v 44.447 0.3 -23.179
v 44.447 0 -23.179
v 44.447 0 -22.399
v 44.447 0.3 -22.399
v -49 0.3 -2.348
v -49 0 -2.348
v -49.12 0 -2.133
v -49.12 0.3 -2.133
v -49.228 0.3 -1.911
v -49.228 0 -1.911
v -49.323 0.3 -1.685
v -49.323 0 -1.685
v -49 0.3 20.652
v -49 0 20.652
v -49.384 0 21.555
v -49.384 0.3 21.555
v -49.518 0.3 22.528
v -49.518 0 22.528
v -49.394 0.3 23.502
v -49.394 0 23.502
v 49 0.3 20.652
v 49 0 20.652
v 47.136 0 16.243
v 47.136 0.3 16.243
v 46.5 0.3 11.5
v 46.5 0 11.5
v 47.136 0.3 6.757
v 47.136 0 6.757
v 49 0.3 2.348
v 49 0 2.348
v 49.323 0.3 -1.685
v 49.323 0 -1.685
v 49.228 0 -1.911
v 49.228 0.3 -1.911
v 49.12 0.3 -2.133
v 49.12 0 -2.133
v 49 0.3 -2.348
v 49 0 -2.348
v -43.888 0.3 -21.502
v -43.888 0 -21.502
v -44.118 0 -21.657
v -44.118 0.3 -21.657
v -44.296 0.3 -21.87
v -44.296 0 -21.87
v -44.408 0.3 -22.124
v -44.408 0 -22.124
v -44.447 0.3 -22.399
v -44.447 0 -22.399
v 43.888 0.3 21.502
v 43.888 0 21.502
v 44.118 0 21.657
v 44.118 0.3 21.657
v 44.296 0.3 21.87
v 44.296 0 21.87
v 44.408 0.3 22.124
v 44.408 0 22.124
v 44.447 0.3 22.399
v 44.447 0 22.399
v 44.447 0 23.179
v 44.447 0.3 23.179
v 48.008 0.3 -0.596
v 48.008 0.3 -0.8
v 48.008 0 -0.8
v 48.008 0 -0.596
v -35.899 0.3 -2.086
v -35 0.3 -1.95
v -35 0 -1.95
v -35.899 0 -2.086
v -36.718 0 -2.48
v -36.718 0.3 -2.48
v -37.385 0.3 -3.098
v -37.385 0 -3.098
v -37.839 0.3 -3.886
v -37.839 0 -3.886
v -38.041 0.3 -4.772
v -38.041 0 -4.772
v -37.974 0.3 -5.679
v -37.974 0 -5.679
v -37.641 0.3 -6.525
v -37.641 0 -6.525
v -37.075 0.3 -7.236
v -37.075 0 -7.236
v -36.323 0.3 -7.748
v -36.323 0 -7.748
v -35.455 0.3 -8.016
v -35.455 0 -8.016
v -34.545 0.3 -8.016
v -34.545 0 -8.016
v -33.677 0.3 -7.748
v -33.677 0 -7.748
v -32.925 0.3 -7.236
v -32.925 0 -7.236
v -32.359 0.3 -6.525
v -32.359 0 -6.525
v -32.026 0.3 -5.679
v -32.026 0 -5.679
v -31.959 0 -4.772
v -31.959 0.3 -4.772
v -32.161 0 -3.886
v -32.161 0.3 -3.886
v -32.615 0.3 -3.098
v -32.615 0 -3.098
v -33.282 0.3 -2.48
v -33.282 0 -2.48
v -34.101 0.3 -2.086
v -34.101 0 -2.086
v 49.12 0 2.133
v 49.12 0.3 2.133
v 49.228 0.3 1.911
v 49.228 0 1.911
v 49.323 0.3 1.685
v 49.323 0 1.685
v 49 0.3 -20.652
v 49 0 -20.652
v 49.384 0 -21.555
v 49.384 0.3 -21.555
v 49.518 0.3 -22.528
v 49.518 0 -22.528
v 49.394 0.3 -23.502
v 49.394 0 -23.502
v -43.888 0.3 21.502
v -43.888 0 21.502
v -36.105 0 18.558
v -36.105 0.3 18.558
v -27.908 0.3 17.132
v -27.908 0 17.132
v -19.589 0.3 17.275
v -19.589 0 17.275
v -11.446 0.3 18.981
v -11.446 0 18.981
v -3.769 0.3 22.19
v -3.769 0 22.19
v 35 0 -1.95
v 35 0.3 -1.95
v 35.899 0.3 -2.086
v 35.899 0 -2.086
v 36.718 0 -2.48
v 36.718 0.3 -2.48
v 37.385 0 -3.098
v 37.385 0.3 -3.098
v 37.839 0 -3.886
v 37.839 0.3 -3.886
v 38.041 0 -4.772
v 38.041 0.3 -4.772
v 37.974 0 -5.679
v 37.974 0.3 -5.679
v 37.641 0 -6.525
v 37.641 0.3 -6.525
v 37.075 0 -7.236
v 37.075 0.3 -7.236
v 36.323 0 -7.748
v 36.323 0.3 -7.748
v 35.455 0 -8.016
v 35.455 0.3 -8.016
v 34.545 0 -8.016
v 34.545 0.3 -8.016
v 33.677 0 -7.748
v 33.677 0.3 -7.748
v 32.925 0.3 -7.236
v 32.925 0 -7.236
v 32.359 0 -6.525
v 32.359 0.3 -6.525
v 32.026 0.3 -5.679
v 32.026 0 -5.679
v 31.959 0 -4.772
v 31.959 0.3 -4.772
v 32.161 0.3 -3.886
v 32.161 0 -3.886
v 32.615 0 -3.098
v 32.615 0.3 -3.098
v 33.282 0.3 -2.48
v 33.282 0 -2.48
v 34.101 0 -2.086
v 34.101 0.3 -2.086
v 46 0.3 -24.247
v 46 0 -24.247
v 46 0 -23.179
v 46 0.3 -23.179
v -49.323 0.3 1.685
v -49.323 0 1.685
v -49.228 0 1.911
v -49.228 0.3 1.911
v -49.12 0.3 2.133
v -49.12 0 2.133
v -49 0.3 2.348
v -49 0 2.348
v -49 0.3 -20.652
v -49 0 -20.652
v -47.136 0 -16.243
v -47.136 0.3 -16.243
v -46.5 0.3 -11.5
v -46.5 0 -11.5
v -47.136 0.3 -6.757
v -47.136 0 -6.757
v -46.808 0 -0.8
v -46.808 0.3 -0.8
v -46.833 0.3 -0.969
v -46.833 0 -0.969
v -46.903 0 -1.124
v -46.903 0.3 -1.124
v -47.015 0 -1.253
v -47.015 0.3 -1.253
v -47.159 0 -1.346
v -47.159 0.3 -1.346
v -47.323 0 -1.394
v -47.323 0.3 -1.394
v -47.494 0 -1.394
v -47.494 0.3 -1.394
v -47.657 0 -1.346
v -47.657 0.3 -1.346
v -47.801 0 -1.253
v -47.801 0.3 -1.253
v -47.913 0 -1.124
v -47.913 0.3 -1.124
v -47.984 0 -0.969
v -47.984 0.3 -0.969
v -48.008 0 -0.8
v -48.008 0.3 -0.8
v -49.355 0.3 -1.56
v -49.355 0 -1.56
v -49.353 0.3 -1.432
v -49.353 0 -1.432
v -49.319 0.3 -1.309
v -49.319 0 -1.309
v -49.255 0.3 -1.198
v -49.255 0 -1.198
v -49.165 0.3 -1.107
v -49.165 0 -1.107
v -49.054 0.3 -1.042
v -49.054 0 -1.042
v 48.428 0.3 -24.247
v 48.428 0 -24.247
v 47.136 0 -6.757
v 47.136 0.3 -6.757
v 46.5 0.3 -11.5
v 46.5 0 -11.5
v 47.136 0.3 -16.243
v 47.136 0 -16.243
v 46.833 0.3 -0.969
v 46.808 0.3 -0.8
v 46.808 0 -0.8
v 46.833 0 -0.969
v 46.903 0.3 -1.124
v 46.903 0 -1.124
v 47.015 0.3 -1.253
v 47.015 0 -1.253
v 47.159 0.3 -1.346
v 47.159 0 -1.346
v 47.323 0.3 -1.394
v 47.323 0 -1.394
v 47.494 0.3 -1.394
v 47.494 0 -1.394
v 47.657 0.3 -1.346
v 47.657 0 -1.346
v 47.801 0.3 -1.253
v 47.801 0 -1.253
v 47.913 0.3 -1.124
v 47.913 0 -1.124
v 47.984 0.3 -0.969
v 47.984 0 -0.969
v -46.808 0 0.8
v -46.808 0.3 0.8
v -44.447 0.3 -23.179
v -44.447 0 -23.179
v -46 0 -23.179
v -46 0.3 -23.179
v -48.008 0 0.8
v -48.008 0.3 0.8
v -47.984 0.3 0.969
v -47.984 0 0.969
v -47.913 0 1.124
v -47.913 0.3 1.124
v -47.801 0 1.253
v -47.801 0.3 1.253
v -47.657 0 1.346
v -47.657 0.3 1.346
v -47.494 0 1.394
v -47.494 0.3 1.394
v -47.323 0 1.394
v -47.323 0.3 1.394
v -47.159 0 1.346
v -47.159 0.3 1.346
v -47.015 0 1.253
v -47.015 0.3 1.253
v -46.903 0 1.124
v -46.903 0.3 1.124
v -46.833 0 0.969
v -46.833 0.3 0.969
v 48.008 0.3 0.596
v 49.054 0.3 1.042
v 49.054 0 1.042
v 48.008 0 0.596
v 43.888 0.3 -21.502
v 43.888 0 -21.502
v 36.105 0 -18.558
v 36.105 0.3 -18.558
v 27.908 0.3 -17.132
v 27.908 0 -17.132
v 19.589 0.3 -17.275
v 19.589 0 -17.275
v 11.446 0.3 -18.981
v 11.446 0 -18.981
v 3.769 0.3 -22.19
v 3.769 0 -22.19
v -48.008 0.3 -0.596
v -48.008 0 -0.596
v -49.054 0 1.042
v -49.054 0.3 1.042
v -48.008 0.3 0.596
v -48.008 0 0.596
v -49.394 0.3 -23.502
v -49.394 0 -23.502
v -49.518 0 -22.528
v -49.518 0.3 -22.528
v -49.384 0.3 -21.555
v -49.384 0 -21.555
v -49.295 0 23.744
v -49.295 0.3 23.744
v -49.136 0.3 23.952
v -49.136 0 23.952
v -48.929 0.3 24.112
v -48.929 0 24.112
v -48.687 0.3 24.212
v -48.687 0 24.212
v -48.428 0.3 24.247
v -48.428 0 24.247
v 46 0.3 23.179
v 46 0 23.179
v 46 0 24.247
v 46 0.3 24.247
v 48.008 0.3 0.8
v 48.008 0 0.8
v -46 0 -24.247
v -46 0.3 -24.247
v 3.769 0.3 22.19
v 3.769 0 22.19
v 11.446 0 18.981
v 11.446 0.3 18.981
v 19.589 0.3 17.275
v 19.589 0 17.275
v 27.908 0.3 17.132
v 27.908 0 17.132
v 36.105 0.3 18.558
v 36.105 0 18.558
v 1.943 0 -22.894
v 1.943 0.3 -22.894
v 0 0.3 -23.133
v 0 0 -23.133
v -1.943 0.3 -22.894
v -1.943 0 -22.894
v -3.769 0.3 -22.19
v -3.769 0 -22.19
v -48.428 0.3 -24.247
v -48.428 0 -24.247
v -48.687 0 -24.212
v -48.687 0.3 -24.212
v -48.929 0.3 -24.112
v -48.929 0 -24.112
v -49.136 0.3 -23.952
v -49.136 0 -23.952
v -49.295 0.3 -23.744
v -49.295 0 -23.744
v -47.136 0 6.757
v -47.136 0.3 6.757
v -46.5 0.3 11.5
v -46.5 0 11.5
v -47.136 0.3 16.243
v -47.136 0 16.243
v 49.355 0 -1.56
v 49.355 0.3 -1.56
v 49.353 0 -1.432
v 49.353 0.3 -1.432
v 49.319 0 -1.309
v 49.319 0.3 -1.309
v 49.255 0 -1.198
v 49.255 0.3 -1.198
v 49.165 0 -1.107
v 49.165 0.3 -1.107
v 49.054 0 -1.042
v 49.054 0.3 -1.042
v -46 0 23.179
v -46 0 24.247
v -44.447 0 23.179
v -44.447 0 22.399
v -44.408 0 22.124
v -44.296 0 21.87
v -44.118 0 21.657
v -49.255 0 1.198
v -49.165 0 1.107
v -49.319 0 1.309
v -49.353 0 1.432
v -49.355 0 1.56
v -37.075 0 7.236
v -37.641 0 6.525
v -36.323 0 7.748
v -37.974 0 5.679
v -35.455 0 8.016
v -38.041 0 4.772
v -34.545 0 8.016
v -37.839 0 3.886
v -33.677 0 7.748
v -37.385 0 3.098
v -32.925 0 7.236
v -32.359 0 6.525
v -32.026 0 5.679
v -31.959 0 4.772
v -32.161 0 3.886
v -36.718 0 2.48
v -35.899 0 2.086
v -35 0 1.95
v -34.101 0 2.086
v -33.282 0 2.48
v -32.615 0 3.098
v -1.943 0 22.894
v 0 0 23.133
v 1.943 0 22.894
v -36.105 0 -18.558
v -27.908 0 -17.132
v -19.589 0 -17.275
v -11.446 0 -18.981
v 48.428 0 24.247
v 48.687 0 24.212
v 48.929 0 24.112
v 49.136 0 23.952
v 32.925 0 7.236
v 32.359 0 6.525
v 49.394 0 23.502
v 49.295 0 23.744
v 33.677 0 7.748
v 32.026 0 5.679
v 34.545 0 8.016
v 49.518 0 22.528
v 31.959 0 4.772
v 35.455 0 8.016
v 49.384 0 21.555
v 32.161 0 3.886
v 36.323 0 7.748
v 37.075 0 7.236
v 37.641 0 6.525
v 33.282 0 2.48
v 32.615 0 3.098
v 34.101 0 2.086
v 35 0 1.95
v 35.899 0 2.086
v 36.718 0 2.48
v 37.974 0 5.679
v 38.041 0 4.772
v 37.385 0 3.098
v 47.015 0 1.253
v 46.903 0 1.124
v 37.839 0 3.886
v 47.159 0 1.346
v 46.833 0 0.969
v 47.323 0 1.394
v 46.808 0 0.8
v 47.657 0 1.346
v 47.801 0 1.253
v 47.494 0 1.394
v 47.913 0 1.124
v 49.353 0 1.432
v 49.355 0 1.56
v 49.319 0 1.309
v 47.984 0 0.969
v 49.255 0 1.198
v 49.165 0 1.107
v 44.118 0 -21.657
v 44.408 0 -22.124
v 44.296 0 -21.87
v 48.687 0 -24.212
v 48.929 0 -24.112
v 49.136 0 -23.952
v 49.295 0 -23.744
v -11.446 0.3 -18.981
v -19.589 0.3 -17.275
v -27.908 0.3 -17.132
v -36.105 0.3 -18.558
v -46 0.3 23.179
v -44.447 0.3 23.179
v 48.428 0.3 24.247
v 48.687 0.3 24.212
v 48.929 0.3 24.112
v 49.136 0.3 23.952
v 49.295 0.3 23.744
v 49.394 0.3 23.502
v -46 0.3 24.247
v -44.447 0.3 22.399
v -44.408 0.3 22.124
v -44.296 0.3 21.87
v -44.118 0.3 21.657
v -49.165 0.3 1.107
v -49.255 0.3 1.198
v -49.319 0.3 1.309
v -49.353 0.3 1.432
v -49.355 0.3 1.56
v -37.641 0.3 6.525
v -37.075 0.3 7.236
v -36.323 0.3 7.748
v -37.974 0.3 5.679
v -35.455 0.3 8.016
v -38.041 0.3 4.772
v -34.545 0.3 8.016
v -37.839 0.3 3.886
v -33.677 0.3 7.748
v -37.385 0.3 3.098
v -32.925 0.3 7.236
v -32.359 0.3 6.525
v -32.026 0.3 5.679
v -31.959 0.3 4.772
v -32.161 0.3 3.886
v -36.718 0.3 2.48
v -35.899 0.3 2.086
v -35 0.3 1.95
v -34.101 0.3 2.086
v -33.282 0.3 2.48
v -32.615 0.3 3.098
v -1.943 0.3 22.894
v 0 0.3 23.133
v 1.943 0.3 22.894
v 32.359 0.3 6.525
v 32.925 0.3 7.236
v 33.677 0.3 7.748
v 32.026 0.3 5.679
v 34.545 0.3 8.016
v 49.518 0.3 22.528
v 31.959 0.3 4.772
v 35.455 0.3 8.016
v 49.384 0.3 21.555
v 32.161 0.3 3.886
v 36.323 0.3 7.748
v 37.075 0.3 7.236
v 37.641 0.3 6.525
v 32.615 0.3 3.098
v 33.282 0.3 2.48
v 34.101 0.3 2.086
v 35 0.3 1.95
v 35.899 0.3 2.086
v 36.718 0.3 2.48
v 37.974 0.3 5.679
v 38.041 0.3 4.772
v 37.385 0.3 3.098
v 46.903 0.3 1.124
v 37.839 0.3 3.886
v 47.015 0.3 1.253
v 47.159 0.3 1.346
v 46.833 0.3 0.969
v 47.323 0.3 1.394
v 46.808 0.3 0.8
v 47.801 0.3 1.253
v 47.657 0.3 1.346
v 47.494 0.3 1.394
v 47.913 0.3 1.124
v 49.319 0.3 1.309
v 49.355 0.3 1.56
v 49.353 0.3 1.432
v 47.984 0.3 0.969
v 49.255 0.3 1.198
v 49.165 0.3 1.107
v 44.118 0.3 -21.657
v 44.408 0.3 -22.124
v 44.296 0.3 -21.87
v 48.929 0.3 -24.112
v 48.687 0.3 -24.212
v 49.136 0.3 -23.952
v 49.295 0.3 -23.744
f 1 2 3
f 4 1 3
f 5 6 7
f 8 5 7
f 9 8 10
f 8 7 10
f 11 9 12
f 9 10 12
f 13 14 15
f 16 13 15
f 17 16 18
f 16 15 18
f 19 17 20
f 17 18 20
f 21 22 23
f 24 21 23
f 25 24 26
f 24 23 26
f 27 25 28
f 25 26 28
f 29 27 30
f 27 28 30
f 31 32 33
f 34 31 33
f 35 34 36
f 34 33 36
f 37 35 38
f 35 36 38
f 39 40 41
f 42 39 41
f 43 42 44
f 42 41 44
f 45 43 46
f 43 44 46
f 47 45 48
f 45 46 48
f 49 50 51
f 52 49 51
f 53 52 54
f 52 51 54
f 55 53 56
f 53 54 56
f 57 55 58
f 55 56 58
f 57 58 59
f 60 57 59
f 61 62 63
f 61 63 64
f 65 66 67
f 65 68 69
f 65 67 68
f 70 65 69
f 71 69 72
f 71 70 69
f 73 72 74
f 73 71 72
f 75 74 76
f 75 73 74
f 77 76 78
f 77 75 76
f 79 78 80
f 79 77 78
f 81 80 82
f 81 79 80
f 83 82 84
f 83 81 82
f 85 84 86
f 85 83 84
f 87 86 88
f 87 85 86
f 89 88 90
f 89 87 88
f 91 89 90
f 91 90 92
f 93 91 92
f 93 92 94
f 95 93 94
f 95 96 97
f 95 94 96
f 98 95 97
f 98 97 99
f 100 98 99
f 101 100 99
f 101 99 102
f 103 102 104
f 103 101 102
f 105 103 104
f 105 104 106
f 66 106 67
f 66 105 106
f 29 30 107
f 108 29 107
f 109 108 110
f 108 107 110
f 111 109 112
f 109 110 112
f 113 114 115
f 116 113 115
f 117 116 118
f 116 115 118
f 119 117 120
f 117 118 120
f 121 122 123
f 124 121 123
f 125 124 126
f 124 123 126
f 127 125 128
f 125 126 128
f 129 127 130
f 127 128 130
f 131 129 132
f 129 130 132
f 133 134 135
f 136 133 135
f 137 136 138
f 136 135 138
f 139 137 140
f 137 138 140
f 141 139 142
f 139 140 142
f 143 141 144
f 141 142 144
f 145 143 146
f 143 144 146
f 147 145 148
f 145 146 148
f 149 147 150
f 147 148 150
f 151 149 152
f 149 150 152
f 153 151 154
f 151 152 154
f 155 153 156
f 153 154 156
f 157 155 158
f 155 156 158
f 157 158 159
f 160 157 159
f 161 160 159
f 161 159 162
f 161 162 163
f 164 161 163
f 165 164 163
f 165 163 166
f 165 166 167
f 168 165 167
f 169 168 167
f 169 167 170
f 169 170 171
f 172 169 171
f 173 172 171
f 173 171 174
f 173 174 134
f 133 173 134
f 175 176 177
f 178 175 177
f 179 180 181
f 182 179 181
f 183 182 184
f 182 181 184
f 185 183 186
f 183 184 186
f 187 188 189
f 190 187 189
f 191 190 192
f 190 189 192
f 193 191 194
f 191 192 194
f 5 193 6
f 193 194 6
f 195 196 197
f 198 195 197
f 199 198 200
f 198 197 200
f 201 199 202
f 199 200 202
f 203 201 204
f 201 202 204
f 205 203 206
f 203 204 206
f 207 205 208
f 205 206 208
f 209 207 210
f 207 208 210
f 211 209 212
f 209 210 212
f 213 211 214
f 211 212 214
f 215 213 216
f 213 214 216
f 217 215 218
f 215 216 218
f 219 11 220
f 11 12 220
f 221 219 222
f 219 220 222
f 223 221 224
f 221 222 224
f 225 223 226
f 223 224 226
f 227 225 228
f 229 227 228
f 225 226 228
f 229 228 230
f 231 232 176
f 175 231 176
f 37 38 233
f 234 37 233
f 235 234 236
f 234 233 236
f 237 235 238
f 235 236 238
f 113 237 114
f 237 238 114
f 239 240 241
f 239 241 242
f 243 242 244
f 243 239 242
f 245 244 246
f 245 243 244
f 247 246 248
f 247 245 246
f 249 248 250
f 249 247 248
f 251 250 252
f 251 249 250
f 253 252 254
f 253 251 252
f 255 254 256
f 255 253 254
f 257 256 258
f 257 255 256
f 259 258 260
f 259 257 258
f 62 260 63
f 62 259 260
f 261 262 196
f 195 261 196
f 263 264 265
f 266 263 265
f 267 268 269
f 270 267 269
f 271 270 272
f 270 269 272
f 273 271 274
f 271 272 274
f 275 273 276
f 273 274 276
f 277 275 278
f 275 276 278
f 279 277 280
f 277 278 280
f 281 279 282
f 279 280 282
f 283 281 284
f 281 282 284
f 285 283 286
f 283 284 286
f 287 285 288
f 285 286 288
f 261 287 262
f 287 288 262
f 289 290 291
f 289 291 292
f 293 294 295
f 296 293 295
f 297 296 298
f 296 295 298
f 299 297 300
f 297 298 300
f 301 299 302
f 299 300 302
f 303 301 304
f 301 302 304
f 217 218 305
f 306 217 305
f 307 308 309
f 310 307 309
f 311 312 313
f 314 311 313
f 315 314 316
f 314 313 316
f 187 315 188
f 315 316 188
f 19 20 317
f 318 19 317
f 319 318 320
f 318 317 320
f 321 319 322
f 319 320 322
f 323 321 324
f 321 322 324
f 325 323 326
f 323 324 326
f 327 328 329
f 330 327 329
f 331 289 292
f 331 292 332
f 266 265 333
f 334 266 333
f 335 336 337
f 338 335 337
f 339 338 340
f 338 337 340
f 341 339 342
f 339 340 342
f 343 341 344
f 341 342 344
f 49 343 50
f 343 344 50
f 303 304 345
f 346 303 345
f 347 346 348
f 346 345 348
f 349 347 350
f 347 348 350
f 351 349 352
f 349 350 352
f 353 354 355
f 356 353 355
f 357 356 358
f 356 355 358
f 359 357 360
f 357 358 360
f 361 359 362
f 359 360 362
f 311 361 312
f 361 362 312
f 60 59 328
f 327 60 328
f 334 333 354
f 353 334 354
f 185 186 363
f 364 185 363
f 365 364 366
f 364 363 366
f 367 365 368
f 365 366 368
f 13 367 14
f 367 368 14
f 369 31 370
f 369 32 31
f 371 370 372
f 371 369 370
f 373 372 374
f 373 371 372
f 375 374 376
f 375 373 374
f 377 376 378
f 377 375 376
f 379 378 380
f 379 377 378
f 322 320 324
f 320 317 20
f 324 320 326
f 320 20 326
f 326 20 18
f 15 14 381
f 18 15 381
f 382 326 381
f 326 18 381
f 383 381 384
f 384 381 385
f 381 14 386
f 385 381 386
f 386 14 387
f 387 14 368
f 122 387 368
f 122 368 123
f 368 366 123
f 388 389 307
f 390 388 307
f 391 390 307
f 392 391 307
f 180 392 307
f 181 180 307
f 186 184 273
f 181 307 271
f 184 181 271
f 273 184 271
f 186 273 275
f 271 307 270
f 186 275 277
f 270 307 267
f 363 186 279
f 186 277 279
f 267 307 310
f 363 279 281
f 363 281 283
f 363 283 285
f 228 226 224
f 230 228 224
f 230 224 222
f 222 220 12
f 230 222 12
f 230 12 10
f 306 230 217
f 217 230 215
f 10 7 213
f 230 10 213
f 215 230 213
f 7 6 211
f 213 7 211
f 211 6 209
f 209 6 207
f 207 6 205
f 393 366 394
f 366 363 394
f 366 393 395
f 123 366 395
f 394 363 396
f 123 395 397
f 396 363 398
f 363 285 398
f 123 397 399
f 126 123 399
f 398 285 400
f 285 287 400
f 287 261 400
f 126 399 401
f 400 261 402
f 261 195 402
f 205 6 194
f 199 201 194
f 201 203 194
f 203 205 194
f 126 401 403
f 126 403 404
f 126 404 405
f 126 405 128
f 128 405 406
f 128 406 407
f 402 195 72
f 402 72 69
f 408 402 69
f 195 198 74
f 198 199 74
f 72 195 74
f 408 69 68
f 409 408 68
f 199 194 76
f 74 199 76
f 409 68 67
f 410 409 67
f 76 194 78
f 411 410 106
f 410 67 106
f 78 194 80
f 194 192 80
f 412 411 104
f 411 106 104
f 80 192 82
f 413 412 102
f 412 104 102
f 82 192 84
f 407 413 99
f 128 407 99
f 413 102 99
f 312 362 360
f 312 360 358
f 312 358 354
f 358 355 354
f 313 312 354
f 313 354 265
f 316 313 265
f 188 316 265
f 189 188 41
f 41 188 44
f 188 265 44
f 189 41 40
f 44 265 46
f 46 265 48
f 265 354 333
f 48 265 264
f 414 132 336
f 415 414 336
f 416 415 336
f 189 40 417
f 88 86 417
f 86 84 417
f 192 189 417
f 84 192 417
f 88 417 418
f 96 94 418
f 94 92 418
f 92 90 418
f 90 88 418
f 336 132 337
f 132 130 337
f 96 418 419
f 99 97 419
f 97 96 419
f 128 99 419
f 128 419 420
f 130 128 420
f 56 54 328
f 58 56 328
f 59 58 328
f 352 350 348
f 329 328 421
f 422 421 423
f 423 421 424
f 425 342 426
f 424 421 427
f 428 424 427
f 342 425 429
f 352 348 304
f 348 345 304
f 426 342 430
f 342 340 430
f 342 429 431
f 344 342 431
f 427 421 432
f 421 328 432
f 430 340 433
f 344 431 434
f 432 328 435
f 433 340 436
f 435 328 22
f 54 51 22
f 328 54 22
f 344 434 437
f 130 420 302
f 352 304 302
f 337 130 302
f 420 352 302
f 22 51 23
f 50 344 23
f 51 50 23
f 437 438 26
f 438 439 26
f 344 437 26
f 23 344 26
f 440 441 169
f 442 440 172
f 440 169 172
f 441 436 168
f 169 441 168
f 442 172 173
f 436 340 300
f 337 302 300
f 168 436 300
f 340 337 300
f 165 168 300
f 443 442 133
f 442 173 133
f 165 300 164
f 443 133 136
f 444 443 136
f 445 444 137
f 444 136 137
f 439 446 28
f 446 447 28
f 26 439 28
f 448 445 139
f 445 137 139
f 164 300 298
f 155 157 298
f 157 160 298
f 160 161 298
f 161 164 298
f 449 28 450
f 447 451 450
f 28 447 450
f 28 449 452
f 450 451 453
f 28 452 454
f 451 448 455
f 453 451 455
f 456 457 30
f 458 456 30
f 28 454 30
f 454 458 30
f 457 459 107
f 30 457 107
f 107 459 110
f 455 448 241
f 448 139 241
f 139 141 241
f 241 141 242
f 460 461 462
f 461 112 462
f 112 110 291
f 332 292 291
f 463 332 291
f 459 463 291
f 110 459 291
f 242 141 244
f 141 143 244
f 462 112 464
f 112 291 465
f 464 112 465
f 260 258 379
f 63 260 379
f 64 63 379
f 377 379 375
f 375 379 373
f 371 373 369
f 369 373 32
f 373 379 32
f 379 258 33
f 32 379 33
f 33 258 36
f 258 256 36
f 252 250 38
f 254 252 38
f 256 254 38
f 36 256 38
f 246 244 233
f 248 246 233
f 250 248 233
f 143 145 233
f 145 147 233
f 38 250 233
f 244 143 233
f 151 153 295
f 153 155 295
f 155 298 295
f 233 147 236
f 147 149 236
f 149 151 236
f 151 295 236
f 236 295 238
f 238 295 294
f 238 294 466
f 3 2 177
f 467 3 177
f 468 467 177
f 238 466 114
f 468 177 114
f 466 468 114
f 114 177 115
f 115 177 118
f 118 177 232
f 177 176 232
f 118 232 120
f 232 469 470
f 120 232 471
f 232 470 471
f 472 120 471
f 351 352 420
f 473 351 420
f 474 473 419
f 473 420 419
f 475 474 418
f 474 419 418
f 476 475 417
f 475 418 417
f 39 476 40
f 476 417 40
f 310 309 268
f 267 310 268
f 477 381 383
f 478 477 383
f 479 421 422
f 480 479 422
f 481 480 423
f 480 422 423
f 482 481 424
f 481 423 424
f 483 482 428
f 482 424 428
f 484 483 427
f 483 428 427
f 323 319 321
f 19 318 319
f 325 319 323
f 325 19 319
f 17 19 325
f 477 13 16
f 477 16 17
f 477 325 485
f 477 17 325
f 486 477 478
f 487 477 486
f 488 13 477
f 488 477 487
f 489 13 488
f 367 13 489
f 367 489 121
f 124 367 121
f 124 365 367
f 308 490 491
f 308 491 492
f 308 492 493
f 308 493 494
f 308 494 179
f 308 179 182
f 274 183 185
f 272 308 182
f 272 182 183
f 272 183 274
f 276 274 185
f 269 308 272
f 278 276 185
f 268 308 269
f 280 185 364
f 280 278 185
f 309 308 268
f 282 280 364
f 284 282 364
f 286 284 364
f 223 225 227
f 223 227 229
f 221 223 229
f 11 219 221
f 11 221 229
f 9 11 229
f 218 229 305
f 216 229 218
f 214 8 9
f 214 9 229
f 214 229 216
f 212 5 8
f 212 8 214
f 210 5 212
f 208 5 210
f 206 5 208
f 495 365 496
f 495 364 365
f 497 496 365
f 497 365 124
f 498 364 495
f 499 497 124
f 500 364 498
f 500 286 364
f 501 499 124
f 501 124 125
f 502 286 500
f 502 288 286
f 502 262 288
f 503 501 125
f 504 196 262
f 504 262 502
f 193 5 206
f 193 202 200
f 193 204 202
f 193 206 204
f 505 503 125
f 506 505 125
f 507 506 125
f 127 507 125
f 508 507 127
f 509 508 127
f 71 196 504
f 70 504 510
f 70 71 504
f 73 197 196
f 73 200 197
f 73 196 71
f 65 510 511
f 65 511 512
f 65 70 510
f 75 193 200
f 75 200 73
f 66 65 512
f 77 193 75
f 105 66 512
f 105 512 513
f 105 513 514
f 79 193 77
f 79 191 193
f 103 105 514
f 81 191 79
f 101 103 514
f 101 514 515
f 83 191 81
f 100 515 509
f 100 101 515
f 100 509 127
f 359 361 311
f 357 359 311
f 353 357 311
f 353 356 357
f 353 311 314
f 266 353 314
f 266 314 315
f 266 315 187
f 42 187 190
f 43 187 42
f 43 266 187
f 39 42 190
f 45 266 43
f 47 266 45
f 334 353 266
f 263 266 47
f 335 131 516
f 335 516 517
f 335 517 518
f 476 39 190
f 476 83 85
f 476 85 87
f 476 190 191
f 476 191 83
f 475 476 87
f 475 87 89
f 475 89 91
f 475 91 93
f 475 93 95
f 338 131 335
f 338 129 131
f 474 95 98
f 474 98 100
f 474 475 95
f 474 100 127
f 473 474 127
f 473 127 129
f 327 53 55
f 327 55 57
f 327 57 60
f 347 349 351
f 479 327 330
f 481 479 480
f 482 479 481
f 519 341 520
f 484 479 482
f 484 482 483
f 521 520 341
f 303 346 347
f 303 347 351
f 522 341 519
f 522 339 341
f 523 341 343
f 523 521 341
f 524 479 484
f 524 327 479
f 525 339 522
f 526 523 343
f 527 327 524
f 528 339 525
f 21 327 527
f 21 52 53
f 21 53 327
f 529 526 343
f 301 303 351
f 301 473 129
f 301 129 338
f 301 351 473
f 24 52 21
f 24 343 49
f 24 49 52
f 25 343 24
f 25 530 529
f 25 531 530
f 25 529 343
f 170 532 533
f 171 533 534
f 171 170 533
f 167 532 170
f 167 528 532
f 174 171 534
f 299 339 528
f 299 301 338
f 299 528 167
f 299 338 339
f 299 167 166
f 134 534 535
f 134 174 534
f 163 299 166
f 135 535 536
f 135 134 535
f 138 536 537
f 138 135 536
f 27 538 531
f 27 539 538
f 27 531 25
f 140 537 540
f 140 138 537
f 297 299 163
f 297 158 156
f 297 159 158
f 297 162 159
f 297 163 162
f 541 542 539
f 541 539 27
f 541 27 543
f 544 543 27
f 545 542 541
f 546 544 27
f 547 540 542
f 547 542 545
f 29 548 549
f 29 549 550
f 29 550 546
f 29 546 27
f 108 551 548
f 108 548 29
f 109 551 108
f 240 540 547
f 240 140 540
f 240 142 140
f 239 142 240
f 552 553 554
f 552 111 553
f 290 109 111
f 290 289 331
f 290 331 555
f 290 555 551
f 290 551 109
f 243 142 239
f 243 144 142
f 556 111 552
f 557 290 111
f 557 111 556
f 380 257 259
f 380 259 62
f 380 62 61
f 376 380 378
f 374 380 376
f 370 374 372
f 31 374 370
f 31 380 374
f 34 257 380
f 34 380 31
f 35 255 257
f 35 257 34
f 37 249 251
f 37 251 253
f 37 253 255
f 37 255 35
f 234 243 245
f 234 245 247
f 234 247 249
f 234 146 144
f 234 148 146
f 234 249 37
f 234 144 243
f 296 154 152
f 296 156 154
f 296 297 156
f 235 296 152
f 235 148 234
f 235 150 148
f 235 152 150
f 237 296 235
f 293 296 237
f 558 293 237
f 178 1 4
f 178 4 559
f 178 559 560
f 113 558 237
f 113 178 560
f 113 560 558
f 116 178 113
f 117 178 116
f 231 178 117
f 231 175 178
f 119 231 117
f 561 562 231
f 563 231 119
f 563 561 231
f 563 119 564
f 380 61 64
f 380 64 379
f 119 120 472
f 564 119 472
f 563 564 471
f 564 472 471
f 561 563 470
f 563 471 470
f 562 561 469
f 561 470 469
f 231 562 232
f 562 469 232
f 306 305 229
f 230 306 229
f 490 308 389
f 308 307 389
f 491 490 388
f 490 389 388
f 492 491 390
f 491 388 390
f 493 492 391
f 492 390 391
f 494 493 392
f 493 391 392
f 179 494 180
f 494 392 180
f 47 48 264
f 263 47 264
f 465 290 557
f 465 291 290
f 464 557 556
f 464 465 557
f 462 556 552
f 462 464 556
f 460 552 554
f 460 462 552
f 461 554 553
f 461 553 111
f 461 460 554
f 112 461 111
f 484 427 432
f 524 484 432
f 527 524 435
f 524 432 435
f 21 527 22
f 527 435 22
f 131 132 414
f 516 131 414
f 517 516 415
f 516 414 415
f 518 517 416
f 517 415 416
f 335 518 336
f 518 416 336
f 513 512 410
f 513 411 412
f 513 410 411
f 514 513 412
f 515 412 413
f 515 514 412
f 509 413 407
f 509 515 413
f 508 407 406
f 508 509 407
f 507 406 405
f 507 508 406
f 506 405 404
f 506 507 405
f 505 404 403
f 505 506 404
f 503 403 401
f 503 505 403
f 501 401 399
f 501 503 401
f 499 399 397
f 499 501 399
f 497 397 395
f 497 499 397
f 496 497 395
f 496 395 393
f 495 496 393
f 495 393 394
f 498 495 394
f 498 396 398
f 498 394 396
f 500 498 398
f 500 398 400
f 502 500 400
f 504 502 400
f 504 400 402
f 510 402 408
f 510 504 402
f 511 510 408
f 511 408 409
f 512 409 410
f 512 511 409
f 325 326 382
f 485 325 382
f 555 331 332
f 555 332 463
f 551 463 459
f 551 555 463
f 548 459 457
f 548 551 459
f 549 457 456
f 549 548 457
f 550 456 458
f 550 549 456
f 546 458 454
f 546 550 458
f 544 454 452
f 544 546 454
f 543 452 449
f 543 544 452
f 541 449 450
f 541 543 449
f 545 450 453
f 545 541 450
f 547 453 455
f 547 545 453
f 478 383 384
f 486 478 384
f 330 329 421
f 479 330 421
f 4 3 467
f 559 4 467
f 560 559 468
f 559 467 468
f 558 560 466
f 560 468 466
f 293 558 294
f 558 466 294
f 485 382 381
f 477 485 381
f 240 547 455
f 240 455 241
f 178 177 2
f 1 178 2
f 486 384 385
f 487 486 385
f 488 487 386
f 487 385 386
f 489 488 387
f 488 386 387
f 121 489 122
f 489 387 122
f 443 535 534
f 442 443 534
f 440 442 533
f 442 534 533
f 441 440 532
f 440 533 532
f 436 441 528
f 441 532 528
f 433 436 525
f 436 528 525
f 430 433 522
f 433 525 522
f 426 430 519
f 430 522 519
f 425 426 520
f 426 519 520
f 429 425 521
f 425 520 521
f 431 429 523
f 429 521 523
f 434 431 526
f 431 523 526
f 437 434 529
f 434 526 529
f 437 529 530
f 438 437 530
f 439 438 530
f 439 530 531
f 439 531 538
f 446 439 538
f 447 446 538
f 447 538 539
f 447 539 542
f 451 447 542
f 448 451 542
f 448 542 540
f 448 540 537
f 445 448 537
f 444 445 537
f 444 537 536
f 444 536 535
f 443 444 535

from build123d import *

# Parameters (mm, degrees)
BOSS_EXTRUDE1_DEPTH = 0.3
CUT_EXTRUDE1_DEPTH  = 0.3
SKETCH3_R           = 3.05
CUT_EXTRUDE2_DEPTH  = 10
FILLET3_R           = 0.5


with BuildPart() as part:
    # Sketch1 → Boss-Extrude1 (new body)
    with BuildSketch(Plane(origin=(0, 0, 0), x_dir=(1, 0, 0), z_dir=(0, 1, 0))):
        with BuildLine():
            Line((-46, 24.246517619), (-48.427621072, 24.246517619))
            ThreePointArc((-48.427621072, 24.246517619), (-49.0377529, 24.038817532), (-49.394435861, 23.501995922))
            ThreePointArc((-49.394435861, 23.501995922), (-49.48304753, 22.03719771), (-49, 20.651502609))
            ThreePointArc((-49, 20.651502609), (-46.5, 11.5), (-49, 2.348497391))
            ThreePointArc((-49, 2.348497391), (-49.641560597, 0), (-49, -2.348497391))
            ThreePointArc((-49, -2.348497391), (-46.5, -11.5), (-49, -20.651502609))
            ThreePointArc((-49, -20.651502609), (-49.48304753, -22.03719771), (-49.394435861, -23.501995922))
            ThreePointArc((-49.394435861, -23.501995922), (-49.0377529, -24.038817532), (-48.427621072, -24.246517619))
            Line((-48.427621072, -24.246517619), (-46, -24.246517619))
            Line((-46, -24.246517619), (-46, -23.179169783))
            Line((-46, -23.179169783), (-44.447028528, -23.179169783))
            Line((-44.447028528, -23.179169783), (-44.447028528, -22.399350913))
            ThreePointArc((-44.447028528, -22.399350913), (-44.29574184, -21.870497705), (-43.887657098, -21.501661399))
            ThreePointArc((-43.887657098, -21.501661399), (-23.745443606, -17.006470423), (-3.769230769, -22.189753839))
            ThreePointArc((-3.769230769, -22.189753839), (0, -23.133345446), (3.769230769, -22.189753839))
            ThreePointArc((3.769230769, -22.189753839), (23.745443606, -17.006470423), (43.887657098, -21.501661399))
            ThreePointArc((43.887657098, -21.501661399), (44.29574184, -21.870497705), (44.447028528, -22.399350913))
            Line((44.447028528, -22.399350913), (44.447028528, -23.179169783))
            Line((44.447028528, -23.179169783), (46, -23.179169783))
            Line((46, -23.179169783), (46, -24.246517619))
            Line((46, -24.246517619), (48.427621072, -24.246517619))
            ThreePointArc((48.427621072, -24.246517619), (49.0377529, -24.038817532), (49.394435861, -23.501995922))
            ThreePointArc((49.394435861, -23.501995922), (49.48304753, -22.03719771), (49, -20.651502609))
            ThreePointArc((49, -20.651502609), (46.5, -11.5), (49, -2.348497391))
            ThreePointArc((49, -2.348497391), (49.641560597, 0), (49, 2.348497391))
            ThreePointArc((49, 2.348497391), (46.5, 11.5), (49, 20.651502609))
            ThreePointArc((49, 20.651502609), (49.48304753, 22.03719771), (49.394435861, 23.501995922))
            ThreePointArc((49.394435861, 23.501995922), (49.0377529, 24.038817532), (48.427621072, 24.246517619))
            Line((48.427621072, 24.246517619), (46, 24.246517619))
            Line((46, 24.246517619), (46, 23.179169783))
            Line((46, 23.179169783), (44.447028528, 23.179169783))
            Line((44.447028528, 23.179169783), (44.447028528, 22.399350913))
            ThreePointArc((44.447028528, 22.399350913), (44.29574184, 21.870497705), (43.887657098, 21.501661399))
            ThreePointArc((43.887657098, 21.501661399), (23.745443606, 17.006470423), (3.769230769, 22.189753839))
            ThreePointArc((3.769230769, 22.189753839), (0, 23.133345446), (-3.769230769, 22.189753839))
            ThreePointArc((-3.769230769, 22.189753839), (-23.745443606, 17.006470423), (-43.887657098, 21.501661399))
            ThreePointArc((-43.887657098, 21.501661399), (-44.29574184, 21.870497705), (-44.447028528, 22.399350913))
            Line((-44.447028528, 22.399350913), (-44.447028528, 23.179169783))
            Line((-44.447028528, 23.179169783), (-46, 23.179169783))
            Line((-46, 23.179169783), (-46, 24.246517619))
        make_face()
    extrude(amount=BOSS_EXTRUDE1_DEPTH)

    # Sketch2 → Cut-Extrude1 (cut)
    with BuildSketch(Plane(origin=(0, 0.3, 0), x_dir=(1, 0, 0), z_dir=(0, 1, 0))):
        with BuildLine():
            Line((48.008247744, 0.595828641), (51.16087761, 1.941605447))
            Line((51.16087761, 1.941605447), (51.16087761, -1.941605447))
            Line((51.16087761, -1.941605447), (48.008247744, -0.595828641))
            Line((48.008247744, -0.595828641), (48.008247744, -0.8))
            ThreePointArc((48.008247744, -0.8), (47.408247744, -1.4), (46.808247744, -0.8))
            Line((46.808247744, -0.8), (46.808247744, 0.8))
            ThreePointArc((46.808247744, 0.8), (47.408247744, 1.4), (48.008247744, 0.8))
            Line((48.008247744, 0.8), (48.008247744, 0.595828641))
        make_face()
    cut_extrude1 = extrude(amount=-CUT_EXTRUDE1_DEPTH, mode=Mode.SUBTRACT)

    # Sketch3 → Cut-Extrude2 (cut)
    with BuildSketch(Plane(origin=(0, 0.3, 0), x_dir=(1, 0, 0), z_dir=(0, 1, 0))):
        with Locations(Location((35, 5, 0), (0, 0, 270))):
            Circle(SKETCH3_R)
        with Locations(Location((35, -5, 0), (0, 0, 90))):
            Circle(SKETCH3_R)
    cut_extrude2 = extrude(amount=-CUT_EXTRUDE2_DEPTH, mode=Mode.SUBTRACT)

    # Mirror2: Cut-Extrude1, Cut-Extrude2 across plane
    add(cut_extrude1.mirror(Plane(origin=(0, 0, 0), x_dir=(0, 0, 1), z_dir=(1, 0, 0))), mode=Mode.SUBTRACT)
    add(cut_extrude2.mirror(Plane(origin=(0, 0, 0), x_dir=(0, 0, 1), z_dir=(1, 0, 0))), mode=Mode.SUBTRACT)

    # Fillet3
    fillet3_edges = [part.edges().sort_by_distance(p)[0] for p in [
        (49.476795577, 0.15, -1.222714034),
        (49.476795577, 0.15, 1.222714034),
        (-49.476795577, 0.15, 1.222714034),
        (-49.476795577, 0.15, -1.222714034),
    ]]
    fillet(fillet3_edges, radius=FILLET3_R)


solid = part.part
